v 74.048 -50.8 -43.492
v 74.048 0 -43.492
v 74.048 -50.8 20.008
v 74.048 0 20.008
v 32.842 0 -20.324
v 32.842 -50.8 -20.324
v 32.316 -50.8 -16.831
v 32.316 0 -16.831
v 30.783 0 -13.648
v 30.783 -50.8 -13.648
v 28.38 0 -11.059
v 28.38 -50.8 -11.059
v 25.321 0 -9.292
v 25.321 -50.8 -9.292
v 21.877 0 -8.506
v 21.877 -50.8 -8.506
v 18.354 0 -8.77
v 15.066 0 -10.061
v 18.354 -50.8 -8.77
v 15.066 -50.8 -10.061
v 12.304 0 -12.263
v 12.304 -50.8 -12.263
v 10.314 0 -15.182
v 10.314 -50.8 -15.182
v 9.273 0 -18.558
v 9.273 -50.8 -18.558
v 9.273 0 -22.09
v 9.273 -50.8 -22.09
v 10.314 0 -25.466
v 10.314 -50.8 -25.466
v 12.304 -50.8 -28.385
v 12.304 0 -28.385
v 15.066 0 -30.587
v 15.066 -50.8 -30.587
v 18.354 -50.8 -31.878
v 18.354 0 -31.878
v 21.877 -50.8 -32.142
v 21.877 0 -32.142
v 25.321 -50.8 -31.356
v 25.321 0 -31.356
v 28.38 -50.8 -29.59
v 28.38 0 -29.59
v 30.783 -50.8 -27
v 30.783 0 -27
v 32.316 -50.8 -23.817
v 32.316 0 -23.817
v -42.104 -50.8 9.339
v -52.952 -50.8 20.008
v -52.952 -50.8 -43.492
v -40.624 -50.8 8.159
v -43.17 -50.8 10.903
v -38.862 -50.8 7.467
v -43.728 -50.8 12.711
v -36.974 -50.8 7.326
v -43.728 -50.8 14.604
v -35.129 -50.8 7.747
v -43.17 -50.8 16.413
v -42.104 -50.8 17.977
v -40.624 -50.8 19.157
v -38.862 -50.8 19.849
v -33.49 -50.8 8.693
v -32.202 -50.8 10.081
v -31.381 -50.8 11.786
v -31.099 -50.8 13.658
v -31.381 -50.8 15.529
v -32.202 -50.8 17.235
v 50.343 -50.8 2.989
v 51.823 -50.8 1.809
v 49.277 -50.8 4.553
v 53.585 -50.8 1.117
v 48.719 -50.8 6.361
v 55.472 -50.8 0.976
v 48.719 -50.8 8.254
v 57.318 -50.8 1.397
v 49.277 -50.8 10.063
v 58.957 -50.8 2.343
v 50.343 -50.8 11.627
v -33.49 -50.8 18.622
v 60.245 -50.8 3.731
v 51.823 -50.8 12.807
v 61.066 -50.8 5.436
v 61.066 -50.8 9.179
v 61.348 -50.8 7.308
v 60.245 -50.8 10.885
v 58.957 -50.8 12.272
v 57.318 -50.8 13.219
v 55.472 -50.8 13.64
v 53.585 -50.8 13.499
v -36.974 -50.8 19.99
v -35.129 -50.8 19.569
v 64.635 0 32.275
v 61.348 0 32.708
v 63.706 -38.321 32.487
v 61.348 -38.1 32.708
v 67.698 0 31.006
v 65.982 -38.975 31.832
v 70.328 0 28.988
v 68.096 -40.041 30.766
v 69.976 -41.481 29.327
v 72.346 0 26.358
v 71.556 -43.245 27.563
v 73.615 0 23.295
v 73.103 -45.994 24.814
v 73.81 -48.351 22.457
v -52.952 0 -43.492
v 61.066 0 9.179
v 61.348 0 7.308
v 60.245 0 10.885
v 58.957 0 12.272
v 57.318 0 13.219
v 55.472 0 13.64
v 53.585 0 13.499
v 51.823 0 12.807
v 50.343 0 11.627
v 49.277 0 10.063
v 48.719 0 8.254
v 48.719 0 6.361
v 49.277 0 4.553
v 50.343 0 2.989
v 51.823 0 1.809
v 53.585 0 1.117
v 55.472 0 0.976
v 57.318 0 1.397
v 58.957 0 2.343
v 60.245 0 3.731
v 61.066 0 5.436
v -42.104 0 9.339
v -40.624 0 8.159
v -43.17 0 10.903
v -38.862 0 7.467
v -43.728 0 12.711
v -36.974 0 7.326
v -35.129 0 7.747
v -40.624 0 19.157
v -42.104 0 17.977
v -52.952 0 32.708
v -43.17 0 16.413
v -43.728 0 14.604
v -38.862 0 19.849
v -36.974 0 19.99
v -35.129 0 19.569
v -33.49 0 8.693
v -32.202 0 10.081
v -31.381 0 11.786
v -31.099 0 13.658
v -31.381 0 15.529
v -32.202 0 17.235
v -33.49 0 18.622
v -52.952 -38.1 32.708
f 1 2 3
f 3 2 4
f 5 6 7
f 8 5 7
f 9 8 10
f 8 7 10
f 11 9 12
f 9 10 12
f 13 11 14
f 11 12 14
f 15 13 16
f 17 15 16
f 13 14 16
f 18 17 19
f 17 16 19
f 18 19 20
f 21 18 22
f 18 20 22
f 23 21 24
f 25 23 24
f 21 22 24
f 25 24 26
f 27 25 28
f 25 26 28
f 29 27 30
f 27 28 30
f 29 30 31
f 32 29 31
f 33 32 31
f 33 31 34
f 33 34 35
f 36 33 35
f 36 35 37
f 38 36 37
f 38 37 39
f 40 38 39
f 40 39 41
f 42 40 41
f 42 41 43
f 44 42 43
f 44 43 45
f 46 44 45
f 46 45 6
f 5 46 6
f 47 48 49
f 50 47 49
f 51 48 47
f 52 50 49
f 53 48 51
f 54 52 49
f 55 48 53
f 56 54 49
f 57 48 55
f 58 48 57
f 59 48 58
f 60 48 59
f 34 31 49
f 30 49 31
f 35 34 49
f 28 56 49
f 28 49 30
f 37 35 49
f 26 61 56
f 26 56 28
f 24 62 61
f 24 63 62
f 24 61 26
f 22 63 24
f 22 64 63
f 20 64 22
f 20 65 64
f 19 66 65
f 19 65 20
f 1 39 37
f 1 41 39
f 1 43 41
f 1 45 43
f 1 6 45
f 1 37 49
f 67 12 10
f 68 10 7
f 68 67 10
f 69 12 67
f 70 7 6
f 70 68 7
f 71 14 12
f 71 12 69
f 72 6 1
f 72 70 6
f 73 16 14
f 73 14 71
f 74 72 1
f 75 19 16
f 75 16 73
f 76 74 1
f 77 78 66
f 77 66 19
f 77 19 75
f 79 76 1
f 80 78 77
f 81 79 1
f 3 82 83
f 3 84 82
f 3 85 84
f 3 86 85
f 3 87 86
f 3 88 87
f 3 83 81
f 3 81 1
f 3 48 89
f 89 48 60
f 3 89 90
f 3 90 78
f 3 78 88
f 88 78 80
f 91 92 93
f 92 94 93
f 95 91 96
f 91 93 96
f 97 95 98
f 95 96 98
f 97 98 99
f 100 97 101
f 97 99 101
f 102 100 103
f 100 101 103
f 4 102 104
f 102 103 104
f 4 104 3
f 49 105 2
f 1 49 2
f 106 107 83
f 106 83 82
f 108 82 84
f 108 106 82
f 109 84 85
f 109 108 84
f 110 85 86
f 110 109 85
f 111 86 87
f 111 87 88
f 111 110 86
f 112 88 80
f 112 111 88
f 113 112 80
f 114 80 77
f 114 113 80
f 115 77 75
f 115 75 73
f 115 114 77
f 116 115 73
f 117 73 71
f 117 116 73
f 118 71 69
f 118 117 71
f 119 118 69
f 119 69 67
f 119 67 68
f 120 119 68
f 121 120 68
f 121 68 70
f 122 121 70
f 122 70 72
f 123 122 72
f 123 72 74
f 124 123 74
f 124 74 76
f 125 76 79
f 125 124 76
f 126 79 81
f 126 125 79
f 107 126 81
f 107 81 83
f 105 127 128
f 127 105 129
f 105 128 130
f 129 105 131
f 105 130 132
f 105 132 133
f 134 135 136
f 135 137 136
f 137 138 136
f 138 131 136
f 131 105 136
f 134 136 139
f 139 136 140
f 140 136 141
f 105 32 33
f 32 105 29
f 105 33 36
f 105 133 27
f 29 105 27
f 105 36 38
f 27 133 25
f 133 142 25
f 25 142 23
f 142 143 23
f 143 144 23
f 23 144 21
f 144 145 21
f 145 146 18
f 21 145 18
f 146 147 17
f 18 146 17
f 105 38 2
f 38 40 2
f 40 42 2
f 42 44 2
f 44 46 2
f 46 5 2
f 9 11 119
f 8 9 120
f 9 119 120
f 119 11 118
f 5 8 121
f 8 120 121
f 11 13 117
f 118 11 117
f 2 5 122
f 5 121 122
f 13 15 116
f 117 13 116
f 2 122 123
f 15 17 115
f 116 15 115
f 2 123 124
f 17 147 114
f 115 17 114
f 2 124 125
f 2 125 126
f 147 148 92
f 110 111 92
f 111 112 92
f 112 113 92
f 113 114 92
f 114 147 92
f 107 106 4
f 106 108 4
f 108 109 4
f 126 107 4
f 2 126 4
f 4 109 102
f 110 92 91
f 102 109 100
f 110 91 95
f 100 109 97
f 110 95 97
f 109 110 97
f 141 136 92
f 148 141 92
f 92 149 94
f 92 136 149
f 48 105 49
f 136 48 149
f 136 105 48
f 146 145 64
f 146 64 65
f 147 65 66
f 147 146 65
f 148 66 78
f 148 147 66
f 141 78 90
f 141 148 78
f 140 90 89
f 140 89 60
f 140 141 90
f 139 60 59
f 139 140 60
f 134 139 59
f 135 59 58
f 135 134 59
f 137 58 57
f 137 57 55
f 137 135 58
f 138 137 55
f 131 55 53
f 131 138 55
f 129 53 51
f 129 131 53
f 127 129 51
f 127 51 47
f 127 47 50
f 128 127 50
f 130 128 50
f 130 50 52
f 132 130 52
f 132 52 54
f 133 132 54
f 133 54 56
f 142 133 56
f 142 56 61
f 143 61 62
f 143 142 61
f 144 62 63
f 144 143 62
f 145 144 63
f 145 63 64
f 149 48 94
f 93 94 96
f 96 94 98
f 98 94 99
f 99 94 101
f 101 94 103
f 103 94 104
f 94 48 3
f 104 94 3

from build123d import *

# Parameters (mm, degrees)
F0_W     = 127
F0_H     = 76.2
F0_R     = 6.35
F1_DEPTH = 50.8
F2_R     = 11.851043
F3_DEPTH = 71.628
F4_SIZE  = 12.7
F5_R     = 12.7


with BuildPart() as f1:
    # F0 (on Front) → F1 (new body)
    with BuildSketch(Plane.XZ):
        with Locations((10.547942, -5.392222)):
            Rectangle(F0_W, F0_H)
        with Locations((-37.448946, 13.657778)):
            Circle(F0_R, mode=Mode.SUBTRACT)
        with Locations((54.997942, 7.307778)):
            Circle(F0_R, mode=Mode.SUBTRACT)
    extrude(amount=F1_DEPTH)

    # F2 (on face) → F3 (cut)
    with BuildSketch(Plane.XZ.offset(50.8)):
        with Locations((20.991273, -20.324083)):
            Circle(F2_R)
    extrude(amount=-F3_DEPTH, mode=Mode.SUBTRACT)

    # F4
    f4_edges = [f1.edges().sort_by_distance(p)[0] for p in [
        (10.547942, -50.8, 32.707778),
    ]]
    chamfer(f4_edges, length=F4_SIZE)

    # F5
    f5_edges = [f1.edges().sort_by_distance(p)[0] for p in [
        (74.047942, -19.05, 32.707778),
    ]]
    fillet(f5_edges, radius=F5_R)


solid = f1.part
